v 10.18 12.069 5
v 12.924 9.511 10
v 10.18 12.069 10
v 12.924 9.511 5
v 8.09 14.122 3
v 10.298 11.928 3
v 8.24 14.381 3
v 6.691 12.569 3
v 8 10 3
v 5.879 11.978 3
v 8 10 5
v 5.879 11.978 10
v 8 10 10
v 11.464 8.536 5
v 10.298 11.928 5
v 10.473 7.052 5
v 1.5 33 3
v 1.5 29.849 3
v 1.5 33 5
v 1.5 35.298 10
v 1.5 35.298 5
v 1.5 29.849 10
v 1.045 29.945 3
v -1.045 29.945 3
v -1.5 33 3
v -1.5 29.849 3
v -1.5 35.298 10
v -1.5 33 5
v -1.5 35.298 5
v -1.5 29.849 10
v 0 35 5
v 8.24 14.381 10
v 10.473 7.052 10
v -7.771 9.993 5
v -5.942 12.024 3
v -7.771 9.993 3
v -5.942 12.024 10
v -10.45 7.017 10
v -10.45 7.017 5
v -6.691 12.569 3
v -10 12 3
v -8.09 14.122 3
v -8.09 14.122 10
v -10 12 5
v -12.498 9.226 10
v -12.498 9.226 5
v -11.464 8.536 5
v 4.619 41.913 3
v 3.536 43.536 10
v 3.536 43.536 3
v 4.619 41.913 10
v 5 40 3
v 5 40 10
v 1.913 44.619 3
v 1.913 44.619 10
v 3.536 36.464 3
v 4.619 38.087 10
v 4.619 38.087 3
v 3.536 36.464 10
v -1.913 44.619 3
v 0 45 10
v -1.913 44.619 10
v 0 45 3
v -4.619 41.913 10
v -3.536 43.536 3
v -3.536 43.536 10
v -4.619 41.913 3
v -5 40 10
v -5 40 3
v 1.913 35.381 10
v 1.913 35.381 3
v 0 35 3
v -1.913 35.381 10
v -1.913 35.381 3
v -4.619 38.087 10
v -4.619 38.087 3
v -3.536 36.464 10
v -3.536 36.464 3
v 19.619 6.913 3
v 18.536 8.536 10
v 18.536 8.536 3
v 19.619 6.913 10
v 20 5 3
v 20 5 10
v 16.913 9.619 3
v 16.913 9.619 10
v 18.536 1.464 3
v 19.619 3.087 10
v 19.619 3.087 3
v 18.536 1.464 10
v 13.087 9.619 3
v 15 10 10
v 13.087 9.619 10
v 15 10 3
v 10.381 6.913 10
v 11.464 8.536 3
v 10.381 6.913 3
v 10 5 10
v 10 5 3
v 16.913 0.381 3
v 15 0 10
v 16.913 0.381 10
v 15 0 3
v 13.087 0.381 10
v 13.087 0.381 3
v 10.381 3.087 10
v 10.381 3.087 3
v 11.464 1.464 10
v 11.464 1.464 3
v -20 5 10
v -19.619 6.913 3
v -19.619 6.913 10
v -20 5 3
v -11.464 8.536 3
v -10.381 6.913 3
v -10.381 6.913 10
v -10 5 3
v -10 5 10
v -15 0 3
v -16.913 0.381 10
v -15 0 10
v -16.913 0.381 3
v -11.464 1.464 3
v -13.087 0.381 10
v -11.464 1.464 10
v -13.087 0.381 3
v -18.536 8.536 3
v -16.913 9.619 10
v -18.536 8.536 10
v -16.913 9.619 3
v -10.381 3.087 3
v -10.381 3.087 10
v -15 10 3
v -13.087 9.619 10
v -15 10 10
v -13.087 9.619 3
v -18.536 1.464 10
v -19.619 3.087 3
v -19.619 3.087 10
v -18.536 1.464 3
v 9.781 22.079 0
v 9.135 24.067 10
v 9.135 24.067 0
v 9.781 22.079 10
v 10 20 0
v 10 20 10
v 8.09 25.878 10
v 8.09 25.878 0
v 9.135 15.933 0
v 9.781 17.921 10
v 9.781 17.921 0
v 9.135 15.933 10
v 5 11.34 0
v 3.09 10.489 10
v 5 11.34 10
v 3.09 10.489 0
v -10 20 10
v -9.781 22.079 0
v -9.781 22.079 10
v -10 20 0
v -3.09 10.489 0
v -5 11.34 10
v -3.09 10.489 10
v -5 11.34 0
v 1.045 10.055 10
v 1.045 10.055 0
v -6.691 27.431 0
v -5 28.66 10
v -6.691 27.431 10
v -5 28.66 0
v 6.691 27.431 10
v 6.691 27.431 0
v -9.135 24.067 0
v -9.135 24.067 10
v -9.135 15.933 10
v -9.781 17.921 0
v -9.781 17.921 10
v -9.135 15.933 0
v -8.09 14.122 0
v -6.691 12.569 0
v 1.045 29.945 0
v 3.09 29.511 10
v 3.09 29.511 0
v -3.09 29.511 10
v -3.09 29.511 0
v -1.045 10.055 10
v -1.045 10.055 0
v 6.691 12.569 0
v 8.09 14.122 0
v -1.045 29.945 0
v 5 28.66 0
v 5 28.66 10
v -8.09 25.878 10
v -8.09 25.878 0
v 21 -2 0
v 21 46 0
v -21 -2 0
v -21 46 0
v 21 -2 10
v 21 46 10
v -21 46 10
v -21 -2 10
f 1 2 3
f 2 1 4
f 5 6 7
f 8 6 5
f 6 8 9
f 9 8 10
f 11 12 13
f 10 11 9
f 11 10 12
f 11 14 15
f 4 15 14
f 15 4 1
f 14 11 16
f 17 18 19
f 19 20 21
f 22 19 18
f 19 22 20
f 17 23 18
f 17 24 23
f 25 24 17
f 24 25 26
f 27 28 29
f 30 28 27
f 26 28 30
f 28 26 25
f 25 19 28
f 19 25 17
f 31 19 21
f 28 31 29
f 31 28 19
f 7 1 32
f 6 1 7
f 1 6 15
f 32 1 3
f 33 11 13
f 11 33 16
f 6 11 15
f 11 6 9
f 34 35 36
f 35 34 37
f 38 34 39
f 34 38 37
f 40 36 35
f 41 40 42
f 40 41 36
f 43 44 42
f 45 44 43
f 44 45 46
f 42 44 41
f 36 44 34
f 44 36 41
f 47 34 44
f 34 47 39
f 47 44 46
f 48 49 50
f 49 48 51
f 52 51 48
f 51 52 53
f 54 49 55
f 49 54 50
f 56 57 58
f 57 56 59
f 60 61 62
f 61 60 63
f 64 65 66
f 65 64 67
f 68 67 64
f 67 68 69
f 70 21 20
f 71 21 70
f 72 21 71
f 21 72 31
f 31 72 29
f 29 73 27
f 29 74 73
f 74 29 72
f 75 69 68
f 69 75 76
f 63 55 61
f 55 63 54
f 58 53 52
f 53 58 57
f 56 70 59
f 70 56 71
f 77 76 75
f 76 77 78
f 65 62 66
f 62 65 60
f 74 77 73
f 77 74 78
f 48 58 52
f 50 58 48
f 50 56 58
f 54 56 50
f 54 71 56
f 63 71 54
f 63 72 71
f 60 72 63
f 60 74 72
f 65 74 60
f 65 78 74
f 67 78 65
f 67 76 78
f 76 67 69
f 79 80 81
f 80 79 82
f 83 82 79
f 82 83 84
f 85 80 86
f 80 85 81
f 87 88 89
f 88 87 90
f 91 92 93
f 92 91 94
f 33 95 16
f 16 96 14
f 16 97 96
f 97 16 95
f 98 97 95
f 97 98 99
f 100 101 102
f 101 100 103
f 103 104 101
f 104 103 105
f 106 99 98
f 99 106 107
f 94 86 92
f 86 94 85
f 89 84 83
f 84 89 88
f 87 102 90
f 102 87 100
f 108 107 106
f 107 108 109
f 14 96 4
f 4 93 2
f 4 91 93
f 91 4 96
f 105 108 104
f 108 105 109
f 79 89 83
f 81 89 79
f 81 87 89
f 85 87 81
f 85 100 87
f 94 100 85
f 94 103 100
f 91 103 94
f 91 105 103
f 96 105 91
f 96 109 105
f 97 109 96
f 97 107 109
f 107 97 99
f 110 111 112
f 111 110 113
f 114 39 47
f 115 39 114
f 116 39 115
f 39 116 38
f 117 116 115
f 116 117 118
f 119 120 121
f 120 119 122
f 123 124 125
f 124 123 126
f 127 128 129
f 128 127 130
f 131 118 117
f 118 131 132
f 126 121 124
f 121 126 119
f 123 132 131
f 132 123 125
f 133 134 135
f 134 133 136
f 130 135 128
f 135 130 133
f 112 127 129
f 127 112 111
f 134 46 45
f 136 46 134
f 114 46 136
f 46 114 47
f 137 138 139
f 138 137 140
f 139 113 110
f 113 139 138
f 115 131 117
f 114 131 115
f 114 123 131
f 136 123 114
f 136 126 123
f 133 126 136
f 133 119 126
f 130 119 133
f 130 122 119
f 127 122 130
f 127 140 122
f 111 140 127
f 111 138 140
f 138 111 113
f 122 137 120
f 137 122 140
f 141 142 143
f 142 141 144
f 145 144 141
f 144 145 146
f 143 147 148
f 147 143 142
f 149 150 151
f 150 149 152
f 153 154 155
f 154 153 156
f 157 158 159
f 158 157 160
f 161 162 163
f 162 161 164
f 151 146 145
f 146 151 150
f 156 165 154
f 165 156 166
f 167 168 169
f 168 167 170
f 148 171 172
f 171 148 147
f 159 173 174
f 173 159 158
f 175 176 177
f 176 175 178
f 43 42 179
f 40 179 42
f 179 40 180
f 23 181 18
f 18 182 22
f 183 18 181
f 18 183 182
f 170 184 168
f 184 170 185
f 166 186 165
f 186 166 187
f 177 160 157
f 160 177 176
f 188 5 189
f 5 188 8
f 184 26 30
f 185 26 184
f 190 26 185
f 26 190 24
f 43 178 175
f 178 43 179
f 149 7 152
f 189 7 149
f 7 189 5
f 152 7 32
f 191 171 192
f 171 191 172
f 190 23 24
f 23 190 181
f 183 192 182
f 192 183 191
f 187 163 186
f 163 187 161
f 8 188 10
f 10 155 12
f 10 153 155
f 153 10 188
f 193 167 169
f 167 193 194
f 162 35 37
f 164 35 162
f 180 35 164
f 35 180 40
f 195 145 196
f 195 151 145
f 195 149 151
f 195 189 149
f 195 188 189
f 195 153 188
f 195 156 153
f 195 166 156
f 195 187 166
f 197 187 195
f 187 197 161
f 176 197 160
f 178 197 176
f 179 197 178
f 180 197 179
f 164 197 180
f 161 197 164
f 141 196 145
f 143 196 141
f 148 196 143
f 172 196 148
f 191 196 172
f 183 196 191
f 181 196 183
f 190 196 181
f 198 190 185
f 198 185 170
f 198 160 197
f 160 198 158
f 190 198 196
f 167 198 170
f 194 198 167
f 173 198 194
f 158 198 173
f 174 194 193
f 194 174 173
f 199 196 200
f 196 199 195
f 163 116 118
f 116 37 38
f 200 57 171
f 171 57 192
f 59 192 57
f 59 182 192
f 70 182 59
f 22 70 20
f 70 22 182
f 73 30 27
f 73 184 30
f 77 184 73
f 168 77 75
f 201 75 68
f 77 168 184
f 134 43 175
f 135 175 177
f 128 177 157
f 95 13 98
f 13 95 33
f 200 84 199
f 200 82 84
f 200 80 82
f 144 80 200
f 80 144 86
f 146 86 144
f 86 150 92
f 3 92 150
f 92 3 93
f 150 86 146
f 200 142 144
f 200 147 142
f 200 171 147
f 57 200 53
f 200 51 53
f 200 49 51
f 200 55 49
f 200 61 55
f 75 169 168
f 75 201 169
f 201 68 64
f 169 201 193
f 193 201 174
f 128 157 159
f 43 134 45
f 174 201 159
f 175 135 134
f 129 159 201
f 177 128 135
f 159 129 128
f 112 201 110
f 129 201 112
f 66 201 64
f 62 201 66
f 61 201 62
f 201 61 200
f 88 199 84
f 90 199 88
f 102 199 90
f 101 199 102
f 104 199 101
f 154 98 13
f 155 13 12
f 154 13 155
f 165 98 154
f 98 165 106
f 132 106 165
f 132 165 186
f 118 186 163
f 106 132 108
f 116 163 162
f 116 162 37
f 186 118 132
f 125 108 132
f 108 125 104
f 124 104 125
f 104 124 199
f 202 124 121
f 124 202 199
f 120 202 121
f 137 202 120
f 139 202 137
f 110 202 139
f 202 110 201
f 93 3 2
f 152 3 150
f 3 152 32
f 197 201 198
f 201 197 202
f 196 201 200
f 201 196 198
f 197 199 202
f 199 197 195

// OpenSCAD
//Tissue Perfussion


difference(){

      translate([-21,-2,0]){
       cube([42,48,10]);
      }

  union(){
      translate([00,40,3]){
          cylinder(12,5,5);
     }
     translate([15,5,3]){
        cylinder(12,5,5);
     }
     translate([-15,5,3]){
         cylinder(12,5,5);
     }
     translate([0,20,0]){
         //Main cylinder
         cylinder(15,10,10);
     }
     translate([10,2,2]){
         rotate([0,0,35]){
            //cube([3,15,10]);
         }
     }
 
     translate([8,10,3]){
         rotate([0,0,47]){
            cube([3,6,12]);
         translate([0,-6,2]){
             cube([3,6,10]);
         } 
     }
 }
 
     translate([-1.5,27,3]){
            cube([3,6,12]);
         translate([0,5,2]){
             cube([3,6,10]);
         } 
     }
     translate([8,10,3]){
         rotate([0,0,40]){
            cube([3,6,12]);
         translate([0,-6,2]){
             cube([3,6,10]);
         } 
     }
 }
     translate([-10,12,3]){
         rotate([0,0,-42]){
            cube([3,6,12]);
         translate([0,-6,2]){
             cube([3,6,10]);
         } 
     }
 }
     
  }
}
    
